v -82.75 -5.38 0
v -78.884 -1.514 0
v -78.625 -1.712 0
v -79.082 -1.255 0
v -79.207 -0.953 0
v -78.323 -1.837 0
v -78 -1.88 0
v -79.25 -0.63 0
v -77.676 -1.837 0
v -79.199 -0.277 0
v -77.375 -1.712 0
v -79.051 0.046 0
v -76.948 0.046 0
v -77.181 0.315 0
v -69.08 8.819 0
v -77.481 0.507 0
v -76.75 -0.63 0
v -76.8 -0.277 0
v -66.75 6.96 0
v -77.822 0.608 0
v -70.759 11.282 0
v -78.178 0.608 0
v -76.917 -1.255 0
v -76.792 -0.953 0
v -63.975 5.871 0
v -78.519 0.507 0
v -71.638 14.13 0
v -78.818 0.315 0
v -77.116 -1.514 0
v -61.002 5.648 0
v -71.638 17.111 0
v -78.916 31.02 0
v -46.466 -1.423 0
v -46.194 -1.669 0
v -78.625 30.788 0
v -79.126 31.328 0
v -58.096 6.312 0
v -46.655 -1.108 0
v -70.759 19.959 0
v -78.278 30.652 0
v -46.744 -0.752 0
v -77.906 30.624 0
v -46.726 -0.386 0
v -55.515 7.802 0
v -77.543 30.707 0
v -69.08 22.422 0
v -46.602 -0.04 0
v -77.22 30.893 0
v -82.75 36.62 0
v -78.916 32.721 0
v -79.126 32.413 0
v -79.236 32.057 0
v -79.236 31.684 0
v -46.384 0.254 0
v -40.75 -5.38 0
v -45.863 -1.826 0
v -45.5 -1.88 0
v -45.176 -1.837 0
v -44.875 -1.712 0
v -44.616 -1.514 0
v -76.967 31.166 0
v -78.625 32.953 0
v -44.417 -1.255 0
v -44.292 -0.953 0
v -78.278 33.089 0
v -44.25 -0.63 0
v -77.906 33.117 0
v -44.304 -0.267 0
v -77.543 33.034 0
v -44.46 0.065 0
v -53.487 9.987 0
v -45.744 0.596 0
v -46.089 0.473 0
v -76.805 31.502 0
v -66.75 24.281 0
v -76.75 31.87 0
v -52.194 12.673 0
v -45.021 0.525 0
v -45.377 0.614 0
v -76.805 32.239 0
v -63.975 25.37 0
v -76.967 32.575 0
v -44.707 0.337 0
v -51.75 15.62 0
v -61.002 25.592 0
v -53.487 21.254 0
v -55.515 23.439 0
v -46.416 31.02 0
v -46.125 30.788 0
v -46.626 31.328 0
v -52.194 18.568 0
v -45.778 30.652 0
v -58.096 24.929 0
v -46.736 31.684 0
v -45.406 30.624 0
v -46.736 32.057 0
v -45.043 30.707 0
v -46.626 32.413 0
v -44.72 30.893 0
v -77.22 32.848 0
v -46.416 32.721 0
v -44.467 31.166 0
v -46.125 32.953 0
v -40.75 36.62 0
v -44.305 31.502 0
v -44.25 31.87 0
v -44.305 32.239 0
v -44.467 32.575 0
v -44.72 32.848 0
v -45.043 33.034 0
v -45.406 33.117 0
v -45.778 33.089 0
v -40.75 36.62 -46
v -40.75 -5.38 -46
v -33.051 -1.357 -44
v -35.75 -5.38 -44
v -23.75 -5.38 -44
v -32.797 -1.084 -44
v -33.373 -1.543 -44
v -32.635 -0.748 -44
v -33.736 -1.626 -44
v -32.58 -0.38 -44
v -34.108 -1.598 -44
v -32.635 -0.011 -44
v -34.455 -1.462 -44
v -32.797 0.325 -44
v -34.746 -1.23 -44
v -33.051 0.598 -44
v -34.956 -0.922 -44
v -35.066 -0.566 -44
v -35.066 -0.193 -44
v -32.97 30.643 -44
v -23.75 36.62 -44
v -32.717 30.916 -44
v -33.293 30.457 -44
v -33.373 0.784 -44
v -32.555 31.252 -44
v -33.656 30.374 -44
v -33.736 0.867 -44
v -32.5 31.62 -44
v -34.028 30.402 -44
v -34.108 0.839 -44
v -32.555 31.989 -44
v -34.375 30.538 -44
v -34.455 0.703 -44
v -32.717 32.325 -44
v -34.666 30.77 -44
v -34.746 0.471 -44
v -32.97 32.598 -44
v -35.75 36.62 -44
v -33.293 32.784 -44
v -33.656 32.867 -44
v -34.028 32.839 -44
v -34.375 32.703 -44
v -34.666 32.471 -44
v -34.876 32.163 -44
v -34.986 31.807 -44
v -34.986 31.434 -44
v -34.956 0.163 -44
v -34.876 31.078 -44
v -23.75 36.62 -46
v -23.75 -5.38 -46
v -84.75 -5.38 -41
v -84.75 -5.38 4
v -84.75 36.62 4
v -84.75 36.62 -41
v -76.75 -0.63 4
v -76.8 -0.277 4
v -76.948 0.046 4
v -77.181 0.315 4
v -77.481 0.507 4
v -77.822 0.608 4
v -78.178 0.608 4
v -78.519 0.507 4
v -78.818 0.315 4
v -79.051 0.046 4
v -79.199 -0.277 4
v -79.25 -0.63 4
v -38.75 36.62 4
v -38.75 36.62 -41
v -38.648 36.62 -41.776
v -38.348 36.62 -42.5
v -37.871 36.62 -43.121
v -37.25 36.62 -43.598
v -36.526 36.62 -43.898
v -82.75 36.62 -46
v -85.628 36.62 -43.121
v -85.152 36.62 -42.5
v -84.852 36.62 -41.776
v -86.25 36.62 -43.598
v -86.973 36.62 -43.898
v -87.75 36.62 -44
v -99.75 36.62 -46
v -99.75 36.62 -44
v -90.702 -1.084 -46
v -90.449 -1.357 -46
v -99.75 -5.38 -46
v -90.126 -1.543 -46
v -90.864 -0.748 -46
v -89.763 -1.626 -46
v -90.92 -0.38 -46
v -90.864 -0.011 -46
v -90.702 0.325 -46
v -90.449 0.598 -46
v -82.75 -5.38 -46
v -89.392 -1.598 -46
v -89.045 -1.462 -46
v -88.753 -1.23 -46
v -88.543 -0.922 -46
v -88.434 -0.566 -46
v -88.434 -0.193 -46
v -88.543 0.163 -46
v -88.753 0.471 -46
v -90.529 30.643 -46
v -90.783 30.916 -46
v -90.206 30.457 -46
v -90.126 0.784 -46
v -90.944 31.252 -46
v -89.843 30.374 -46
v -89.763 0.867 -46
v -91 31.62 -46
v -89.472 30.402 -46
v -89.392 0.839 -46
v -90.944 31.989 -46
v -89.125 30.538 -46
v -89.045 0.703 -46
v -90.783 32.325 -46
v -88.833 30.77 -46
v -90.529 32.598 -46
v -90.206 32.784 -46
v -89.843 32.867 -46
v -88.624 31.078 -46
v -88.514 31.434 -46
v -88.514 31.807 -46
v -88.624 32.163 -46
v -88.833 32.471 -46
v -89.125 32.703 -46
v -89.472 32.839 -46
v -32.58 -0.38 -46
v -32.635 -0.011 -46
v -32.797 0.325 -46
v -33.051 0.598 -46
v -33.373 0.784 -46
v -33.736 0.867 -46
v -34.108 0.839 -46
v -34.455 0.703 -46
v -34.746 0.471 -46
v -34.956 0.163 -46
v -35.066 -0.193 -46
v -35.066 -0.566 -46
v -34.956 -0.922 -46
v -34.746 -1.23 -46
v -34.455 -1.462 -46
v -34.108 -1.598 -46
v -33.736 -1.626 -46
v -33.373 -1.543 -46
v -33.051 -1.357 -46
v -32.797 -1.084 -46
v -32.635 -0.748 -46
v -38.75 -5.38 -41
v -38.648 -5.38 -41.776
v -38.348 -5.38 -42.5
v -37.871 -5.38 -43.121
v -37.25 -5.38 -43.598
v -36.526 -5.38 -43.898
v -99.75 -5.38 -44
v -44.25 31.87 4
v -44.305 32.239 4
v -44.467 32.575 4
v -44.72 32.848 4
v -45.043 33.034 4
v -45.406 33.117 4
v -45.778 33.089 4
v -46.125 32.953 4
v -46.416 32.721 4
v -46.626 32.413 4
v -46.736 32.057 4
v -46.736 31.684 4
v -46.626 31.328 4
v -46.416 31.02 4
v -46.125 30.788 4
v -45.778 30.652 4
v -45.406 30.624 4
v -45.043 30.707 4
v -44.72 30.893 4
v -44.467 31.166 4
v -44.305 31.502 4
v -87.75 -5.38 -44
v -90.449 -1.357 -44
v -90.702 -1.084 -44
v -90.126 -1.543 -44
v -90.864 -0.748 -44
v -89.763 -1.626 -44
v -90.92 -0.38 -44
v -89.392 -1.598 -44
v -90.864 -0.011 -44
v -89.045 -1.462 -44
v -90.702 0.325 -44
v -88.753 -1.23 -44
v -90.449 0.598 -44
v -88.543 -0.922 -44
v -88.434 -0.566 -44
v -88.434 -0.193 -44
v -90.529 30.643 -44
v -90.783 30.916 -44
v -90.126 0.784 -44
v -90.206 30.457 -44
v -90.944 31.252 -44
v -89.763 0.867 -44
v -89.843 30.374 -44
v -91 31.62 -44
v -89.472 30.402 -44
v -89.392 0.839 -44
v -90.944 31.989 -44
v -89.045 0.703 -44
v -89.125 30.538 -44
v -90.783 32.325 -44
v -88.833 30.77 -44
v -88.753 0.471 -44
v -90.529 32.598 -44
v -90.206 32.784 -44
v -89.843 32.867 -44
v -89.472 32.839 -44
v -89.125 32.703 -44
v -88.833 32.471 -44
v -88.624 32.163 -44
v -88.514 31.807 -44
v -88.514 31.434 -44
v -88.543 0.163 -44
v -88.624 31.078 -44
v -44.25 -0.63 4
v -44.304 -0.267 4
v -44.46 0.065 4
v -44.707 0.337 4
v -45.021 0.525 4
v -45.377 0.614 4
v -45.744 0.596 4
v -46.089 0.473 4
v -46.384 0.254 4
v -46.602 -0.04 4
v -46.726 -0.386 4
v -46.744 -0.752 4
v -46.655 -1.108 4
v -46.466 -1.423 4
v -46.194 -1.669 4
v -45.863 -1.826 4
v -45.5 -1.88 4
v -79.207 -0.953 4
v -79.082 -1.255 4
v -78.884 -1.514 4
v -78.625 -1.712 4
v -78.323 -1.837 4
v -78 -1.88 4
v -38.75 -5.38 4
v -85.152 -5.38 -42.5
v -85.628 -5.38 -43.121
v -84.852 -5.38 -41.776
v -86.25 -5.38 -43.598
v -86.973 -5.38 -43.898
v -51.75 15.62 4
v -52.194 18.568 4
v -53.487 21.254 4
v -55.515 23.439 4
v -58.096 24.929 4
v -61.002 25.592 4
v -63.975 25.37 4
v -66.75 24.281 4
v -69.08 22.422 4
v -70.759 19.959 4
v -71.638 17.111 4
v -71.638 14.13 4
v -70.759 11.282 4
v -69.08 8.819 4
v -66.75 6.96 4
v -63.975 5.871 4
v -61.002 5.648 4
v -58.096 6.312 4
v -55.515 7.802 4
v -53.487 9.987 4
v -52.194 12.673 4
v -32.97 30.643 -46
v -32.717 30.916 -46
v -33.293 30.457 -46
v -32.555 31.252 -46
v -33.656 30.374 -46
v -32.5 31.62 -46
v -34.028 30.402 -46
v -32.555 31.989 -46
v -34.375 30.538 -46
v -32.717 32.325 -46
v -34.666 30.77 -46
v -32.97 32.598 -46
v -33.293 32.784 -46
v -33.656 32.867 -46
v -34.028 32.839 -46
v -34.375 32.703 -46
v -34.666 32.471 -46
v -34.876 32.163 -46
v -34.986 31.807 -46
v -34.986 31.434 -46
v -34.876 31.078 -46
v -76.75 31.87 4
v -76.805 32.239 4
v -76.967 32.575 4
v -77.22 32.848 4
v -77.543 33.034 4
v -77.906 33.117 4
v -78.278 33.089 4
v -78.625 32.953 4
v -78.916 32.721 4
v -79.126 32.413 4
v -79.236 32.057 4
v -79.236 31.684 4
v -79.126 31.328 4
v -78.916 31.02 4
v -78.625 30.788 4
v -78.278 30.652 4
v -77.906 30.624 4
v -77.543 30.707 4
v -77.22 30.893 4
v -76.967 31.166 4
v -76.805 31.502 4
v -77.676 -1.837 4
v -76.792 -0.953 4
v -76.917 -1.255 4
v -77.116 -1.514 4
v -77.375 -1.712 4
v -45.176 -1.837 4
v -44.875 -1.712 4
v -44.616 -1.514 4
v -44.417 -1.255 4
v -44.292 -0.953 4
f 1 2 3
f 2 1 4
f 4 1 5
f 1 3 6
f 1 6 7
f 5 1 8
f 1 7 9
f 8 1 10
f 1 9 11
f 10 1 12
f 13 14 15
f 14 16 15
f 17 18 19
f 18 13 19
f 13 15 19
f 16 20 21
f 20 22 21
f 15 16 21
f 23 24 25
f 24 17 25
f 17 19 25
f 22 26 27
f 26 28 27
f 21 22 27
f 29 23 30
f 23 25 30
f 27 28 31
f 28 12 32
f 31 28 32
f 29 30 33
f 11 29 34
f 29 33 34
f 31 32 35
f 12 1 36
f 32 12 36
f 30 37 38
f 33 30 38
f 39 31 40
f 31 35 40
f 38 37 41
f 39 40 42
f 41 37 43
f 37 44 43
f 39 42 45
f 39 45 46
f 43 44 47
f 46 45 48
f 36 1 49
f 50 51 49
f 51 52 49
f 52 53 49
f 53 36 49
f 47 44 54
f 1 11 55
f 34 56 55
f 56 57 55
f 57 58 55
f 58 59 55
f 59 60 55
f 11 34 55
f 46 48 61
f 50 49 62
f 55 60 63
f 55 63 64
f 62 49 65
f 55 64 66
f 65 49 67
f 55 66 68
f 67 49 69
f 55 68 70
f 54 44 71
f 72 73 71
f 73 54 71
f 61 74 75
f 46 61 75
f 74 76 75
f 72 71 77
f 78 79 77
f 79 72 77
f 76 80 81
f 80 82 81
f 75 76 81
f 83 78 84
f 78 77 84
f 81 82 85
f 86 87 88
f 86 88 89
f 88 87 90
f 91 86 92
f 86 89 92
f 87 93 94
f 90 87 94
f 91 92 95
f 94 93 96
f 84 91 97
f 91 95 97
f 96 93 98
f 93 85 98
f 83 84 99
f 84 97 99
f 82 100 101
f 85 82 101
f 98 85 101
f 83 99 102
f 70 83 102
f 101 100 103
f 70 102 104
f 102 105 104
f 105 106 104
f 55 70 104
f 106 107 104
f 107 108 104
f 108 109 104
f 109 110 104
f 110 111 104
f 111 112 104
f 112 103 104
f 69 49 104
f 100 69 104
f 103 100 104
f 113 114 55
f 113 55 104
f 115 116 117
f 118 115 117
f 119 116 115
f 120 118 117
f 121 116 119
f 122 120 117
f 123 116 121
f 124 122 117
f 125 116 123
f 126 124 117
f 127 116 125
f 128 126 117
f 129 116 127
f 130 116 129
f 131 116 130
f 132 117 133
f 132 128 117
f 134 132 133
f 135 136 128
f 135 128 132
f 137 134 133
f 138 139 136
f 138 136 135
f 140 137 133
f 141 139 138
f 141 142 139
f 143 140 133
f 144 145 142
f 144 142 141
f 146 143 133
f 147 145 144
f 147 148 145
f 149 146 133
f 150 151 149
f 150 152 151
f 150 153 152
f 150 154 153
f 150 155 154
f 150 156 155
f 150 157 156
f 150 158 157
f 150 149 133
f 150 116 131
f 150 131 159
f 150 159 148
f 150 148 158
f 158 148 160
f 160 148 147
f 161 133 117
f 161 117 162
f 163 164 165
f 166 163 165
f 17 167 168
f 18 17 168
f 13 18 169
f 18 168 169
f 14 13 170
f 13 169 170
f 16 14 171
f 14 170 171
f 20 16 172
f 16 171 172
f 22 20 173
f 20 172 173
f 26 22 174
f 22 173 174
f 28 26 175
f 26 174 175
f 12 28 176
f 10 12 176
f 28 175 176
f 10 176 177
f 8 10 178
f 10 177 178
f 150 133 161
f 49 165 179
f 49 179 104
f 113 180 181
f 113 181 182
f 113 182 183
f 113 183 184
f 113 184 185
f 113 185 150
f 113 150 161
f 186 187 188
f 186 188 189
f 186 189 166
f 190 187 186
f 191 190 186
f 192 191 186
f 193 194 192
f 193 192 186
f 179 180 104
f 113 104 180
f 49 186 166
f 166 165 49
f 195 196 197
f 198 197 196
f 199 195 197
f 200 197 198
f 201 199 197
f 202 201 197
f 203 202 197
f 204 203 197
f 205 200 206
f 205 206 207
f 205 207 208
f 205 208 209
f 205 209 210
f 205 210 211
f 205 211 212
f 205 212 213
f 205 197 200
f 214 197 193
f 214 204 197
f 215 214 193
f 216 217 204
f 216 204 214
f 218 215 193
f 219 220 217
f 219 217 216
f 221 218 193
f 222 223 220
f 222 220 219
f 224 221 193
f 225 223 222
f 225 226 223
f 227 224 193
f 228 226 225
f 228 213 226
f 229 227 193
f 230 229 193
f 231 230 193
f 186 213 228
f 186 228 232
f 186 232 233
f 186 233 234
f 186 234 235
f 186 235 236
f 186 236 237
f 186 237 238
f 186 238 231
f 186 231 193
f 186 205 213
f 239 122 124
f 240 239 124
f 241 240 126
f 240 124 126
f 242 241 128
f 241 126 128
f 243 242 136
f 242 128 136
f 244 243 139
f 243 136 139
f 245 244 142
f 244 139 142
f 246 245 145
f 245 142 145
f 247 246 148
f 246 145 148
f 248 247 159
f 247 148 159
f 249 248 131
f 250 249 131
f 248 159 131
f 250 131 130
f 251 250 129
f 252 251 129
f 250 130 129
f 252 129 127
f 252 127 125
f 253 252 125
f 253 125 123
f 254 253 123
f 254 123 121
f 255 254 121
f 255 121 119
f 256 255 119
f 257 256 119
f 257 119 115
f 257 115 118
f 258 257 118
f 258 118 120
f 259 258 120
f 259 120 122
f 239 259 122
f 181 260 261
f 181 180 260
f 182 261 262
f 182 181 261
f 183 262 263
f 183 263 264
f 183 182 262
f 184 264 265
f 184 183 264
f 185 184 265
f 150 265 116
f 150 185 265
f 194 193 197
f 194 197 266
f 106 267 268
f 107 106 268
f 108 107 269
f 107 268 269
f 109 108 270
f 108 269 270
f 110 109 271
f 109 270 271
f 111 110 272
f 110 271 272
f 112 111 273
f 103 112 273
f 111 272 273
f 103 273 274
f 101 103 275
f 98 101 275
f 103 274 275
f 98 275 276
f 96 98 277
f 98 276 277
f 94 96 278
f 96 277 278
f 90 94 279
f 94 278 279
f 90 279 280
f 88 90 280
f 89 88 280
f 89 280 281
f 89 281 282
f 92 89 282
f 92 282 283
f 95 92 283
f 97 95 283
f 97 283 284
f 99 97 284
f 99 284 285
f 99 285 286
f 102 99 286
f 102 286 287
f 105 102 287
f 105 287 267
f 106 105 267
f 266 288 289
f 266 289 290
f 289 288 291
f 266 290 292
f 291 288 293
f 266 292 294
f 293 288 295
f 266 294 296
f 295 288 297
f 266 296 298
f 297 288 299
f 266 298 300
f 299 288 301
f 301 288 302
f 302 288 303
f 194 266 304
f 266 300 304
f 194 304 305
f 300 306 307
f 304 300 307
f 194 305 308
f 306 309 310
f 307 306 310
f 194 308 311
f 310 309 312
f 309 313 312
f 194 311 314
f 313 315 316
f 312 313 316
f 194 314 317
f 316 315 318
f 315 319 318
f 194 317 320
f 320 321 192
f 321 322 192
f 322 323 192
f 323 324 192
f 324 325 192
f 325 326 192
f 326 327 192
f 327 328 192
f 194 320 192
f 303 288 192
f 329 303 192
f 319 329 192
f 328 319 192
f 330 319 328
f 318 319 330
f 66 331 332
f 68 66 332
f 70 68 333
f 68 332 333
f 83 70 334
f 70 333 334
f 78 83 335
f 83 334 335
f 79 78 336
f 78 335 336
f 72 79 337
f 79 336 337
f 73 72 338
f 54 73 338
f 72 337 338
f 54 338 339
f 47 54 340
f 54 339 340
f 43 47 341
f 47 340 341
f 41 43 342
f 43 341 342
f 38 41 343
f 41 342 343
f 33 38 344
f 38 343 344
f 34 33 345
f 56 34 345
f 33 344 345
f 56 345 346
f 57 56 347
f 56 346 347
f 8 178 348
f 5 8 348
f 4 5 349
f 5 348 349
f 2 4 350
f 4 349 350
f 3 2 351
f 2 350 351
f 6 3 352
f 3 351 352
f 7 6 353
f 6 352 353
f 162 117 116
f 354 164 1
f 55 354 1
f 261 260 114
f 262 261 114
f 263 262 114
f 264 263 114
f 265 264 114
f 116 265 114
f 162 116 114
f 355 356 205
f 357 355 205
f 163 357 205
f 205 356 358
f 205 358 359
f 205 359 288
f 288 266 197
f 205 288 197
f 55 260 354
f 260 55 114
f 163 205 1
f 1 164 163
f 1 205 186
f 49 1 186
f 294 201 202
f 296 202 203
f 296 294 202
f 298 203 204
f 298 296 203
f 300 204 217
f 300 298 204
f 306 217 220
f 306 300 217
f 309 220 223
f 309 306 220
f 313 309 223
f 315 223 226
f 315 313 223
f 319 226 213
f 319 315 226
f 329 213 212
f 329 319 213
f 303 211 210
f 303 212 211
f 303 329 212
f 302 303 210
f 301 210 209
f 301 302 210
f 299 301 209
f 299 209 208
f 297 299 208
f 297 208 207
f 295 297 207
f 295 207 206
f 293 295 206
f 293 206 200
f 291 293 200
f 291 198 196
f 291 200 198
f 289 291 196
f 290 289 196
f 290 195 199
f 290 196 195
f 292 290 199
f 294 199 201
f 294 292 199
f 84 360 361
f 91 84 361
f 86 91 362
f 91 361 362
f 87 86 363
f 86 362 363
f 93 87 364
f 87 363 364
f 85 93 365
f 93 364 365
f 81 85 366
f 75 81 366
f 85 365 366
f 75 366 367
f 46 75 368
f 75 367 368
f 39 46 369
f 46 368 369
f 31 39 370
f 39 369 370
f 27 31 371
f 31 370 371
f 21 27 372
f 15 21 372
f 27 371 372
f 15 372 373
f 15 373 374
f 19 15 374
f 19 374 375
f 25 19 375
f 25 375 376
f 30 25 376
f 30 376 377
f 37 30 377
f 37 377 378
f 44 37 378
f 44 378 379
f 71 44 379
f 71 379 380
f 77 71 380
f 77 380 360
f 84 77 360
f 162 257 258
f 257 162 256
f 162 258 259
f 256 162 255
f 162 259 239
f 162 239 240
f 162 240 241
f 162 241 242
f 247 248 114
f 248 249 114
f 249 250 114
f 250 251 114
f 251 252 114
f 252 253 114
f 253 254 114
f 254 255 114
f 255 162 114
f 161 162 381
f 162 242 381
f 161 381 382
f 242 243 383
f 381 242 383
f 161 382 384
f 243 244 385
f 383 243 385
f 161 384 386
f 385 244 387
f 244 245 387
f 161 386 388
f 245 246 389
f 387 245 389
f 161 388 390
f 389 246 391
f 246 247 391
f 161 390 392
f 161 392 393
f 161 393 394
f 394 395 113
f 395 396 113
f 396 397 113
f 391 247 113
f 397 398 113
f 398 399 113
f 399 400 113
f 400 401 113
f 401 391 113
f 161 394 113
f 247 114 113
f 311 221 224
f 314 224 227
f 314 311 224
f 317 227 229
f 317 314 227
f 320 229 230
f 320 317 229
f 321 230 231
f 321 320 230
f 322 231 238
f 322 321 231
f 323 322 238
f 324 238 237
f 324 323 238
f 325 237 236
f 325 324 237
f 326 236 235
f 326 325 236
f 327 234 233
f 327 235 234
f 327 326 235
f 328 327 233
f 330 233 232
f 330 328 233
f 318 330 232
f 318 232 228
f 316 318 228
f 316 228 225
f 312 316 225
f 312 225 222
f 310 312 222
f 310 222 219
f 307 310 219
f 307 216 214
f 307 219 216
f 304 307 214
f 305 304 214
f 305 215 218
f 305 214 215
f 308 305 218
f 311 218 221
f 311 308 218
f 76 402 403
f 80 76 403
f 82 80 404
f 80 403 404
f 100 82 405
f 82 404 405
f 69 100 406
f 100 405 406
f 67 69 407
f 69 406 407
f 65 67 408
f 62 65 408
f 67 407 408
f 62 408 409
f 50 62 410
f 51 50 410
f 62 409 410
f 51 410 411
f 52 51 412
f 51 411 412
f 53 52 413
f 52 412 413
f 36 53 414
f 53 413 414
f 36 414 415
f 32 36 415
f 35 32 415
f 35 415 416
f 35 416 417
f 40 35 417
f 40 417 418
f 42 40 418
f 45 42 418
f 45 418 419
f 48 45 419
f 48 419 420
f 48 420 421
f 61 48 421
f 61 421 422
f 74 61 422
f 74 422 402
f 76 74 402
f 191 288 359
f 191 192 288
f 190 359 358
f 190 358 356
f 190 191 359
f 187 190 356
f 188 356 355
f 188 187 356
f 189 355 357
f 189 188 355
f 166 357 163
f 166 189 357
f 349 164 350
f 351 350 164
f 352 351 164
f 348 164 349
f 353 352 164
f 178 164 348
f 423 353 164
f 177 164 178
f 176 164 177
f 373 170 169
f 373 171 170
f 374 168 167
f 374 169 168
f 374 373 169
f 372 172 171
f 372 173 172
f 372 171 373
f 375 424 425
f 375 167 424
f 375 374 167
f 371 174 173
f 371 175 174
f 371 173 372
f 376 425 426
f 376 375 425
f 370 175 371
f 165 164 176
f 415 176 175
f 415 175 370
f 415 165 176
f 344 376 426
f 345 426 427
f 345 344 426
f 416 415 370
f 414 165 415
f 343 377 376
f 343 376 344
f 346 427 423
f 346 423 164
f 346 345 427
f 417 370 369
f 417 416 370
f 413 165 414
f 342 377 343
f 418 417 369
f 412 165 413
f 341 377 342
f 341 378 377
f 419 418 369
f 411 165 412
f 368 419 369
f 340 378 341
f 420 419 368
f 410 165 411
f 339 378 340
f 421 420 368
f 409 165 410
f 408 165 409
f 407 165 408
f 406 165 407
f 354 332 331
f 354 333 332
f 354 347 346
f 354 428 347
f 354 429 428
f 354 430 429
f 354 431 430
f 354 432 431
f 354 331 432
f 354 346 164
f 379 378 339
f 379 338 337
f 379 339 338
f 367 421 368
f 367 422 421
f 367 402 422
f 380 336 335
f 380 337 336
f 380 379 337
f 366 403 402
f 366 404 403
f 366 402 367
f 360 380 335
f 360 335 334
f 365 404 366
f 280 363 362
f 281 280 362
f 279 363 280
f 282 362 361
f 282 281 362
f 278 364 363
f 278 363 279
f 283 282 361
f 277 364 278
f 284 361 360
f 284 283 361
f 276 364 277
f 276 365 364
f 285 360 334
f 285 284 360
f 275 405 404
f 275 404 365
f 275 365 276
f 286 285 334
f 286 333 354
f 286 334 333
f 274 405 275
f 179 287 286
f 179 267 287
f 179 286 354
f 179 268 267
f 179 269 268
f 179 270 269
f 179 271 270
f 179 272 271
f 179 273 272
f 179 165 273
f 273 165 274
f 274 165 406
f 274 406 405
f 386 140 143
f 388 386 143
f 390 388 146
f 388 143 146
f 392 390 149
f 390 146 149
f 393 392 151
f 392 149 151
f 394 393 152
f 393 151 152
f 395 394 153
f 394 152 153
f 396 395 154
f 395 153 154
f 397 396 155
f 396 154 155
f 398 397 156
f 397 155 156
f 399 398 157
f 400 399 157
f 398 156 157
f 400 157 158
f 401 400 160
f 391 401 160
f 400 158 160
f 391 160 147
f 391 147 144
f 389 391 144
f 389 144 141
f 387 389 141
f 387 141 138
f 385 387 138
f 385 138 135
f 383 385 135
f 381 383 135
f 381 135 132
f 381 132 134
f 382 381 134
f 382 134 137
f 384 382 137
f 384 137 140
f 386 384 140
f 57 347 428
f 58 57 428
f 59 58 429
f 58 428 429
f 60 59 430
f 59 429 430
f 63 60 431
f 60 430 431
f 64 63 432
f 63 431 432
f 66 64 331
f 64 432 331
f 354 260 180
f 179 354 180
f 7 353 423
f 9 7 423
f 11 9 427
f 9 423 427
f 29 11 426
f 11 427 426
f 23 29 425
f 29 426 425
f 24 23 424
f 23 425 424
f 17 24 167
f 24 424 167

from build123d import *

# Parameters (mm, degrees)
CROQUIS1_W              = 46
CROQUIS1_H              = 42
SALIENTE_EXTRUIR1_DEPTH = 4
CROQUIS3_W              = 2
CROQUIS3_H              = 42
SALIENTE_EXTRUIR2_DEPTH = 46
CROQUIS4_W              = 2
CROQUIS4_H              = 42
SALIENTE_EXTRUIR3_DEPTH = 15
CROQUIS6_W              = 2
CROQUIS6_H              = 42
SALIENTE_EXTRUIR4_DEPTH = 15
CROQUIS8_R              = 1.25
CORTAR_EXTRUIR1_DEPTH   = 15
CORTAR_EXTRUIR2_DEPTH   = 15
CROQUIS10_R             = 1.25
CORTAR_EXTRUIR4_DEPTH   = 15
REDONDEO1_R             = 3
REDONDEO2_R             = 3
CROQUIS11_R             = 10
CORTAR_EXTRUIR5_DEPTH   = 15


with BuildPart() as part:
    # Croquis1 → Saliente-Extruir1 (new body)
    with BuildSketch(Plane.XY):
        with Locations((-61.749794594, 15.620374367)):
            Rectangle(CROQUIS1_W, CROQUIS1_H)
    extrude(amount=SALIENTE_EXTRUIR1_DEPTH)

    # Croquis3 → Saliente-Extruir2 (add)
    with BuildSketch(Plane(origin=(0, 0, 0), x_dir=(-1, 0, 0), z_dir=(0, 0, -1))):
        with Locations((83.749794594, 15.620374367)):
            Rectangle(CROQUIS3_W, CROQUIS3_H)
        with Locations((39.749794594, 15.620374367)):
            Rectangle(CROQUIS3_W, CROQUIS3_H)
    extrude(amount=SALIENTE_EXTRUIR2_DEPTH)

    # Croquis4 → Saliente-Extruir3 (add)
    with BuildSketch(Plane.ZY.offset(84.749794594)):
        with Locations((-45, 15.620374367)):
            Rectangle(CROQUIS4_W, CROQUIS4_H)
    extrude(amount=SALIENTE_EXTRUIR3_DEPTH)

    # Croquis6 → Saliente-Extruir4 (add)
    with BuildSketch(Plane(origin=(-38.749794594, 0, 0), x_dir=(0, 0, -1), z_dir=(1, 0, 0))):
        with Locations((45, 15.620374367)):
            Rectangle(CROQUIS6_W, CROQUIS6_H)
    extrude(amount=SALIENTE_EXTRUIR4_DEPTH)

    # Croquis8 → Cortar-Extruir1 (cut)
    with BuildSketch(Plane.XY.offset(4)):
        with Locations((-45.499794594, 31.870374367)):
            Circle(CROQUIS8_R)
        with BuildLine():
            ThreePointArc((-79.249794594, -0.629625633), (-78.88367807, -1.51350911), (-77.999794594, -1.879625633))
            Line((-77.999794594, -1.879625633), (-77.999794594, -0.629625633))
            Line((-77.999794594, -0.629625633), (-79.249794594, -0.629625633))
        make_face()
        with BuildLine():
            Line((-77.999794594, -0.629625633), (-77.999794594, -1.879625633))
            ThreePointArc((-77.999794594, -1.879625633), (-77.115911117, -1.51350911), (-76.749794594, -0.629625633))
            ThreePointArc((-76.749794594, -0.629625633), (-77.999794594, 0.620374367), (-79.249794594, -0.629625633))
            Line((-79.249794594, -0.629625633), (-77.999794594, -0.629625633))
        make_face()
        with Locations((-77.999794594, 31.870374367)):
            Circle(CROQUIS8_R)
    extrude(amount=-CORTAR_EXTRUIR1_DEPTH, mode=Mode.SUBTRACT)

    # Croquis7 → Cortar-Extruir2 (cut)
    with BuildSketch(Plane.XY.offset(4)):
        with BuildLine():
            ThreePointArc((-44.249794594, -0.629625633), (-46.38367807, 0.254257843), (-45.499794594, -1.879625633))
            Line((-45.499794594, -1.879625633), (-45.499794594, -0.629625633))
            Line((-45.499794594, -0.629625633), (-44.249794594, -0.629625633))
        make_face()
        with BuildLine():
            Line((-45.499794594, -0.629625633), (-45.499794594, -1.879625633))
            ThreePointArc((-45.499794594, -1.879625633), (-44.615911117, -1.51350911), (-44.249794594, -0.629625633))
            Line((-44.249794594, -0.629625633), (-45.499794594, -0.629625633))
        make_face()
    extrude(amount=-CORTAR_EXTRUIR2_DEPTH, mode=Mode.SUBTRACT)

    # Croquis10 → Cortar-Extruir4 (cut)
    with BuildSketch(Plane.XY.offset(-44)):
        with Locations((-33.749794594, 31.620374367)):
            Circle(CROQUIS10_R)
        with Locations((-33.829898146, -0.379625633)):
            Circle(CROQUIS10_R)
    cortar_extruir4 = extrude(amount=-CORTAR_EXTRUIR4_DEPTH, mode=Mode.SUBTRACT)

    # Simetría1: Cortar-Extruir4 across plane
    add(cortar_extruir4.mirror(Plane(origin=(-61.749794594, 0, 0), x_dir=(0, 0, 1), z_dir=(1, 0, 0))), mode=Mode.SUBTRACT)

    # Redondeo1
    redondeo1_edges = [part.edges().sort_by_distance(p)[0] for p in [
        (-84.749794594, 15.620374367, -44),
    ]]
    fillet(redondeo1_edges, radius=REDONDEO1_R)

    # Redondeo2
    redondeo2_edges = [part.edges().sort_by_distance(p)[0] for p in [
        (-38.749794594, 15.620374367, -44),
    ]]
    fillet(redondeo2_edges, radius=REDONDEO2_R)

    # Croquis11 → Cortar-Extruir5 (cut)
    with BuildSketch(Plane.XY.offset(4)):
        with Locations((-61.749794594, 15.620374367)):
            Circle(CROQUIS11_R)
    extrude(amount=-CORTAR_EXTRUIR5_DEPTH, mode=Mode.SUBTRACT)


solid = part.part
